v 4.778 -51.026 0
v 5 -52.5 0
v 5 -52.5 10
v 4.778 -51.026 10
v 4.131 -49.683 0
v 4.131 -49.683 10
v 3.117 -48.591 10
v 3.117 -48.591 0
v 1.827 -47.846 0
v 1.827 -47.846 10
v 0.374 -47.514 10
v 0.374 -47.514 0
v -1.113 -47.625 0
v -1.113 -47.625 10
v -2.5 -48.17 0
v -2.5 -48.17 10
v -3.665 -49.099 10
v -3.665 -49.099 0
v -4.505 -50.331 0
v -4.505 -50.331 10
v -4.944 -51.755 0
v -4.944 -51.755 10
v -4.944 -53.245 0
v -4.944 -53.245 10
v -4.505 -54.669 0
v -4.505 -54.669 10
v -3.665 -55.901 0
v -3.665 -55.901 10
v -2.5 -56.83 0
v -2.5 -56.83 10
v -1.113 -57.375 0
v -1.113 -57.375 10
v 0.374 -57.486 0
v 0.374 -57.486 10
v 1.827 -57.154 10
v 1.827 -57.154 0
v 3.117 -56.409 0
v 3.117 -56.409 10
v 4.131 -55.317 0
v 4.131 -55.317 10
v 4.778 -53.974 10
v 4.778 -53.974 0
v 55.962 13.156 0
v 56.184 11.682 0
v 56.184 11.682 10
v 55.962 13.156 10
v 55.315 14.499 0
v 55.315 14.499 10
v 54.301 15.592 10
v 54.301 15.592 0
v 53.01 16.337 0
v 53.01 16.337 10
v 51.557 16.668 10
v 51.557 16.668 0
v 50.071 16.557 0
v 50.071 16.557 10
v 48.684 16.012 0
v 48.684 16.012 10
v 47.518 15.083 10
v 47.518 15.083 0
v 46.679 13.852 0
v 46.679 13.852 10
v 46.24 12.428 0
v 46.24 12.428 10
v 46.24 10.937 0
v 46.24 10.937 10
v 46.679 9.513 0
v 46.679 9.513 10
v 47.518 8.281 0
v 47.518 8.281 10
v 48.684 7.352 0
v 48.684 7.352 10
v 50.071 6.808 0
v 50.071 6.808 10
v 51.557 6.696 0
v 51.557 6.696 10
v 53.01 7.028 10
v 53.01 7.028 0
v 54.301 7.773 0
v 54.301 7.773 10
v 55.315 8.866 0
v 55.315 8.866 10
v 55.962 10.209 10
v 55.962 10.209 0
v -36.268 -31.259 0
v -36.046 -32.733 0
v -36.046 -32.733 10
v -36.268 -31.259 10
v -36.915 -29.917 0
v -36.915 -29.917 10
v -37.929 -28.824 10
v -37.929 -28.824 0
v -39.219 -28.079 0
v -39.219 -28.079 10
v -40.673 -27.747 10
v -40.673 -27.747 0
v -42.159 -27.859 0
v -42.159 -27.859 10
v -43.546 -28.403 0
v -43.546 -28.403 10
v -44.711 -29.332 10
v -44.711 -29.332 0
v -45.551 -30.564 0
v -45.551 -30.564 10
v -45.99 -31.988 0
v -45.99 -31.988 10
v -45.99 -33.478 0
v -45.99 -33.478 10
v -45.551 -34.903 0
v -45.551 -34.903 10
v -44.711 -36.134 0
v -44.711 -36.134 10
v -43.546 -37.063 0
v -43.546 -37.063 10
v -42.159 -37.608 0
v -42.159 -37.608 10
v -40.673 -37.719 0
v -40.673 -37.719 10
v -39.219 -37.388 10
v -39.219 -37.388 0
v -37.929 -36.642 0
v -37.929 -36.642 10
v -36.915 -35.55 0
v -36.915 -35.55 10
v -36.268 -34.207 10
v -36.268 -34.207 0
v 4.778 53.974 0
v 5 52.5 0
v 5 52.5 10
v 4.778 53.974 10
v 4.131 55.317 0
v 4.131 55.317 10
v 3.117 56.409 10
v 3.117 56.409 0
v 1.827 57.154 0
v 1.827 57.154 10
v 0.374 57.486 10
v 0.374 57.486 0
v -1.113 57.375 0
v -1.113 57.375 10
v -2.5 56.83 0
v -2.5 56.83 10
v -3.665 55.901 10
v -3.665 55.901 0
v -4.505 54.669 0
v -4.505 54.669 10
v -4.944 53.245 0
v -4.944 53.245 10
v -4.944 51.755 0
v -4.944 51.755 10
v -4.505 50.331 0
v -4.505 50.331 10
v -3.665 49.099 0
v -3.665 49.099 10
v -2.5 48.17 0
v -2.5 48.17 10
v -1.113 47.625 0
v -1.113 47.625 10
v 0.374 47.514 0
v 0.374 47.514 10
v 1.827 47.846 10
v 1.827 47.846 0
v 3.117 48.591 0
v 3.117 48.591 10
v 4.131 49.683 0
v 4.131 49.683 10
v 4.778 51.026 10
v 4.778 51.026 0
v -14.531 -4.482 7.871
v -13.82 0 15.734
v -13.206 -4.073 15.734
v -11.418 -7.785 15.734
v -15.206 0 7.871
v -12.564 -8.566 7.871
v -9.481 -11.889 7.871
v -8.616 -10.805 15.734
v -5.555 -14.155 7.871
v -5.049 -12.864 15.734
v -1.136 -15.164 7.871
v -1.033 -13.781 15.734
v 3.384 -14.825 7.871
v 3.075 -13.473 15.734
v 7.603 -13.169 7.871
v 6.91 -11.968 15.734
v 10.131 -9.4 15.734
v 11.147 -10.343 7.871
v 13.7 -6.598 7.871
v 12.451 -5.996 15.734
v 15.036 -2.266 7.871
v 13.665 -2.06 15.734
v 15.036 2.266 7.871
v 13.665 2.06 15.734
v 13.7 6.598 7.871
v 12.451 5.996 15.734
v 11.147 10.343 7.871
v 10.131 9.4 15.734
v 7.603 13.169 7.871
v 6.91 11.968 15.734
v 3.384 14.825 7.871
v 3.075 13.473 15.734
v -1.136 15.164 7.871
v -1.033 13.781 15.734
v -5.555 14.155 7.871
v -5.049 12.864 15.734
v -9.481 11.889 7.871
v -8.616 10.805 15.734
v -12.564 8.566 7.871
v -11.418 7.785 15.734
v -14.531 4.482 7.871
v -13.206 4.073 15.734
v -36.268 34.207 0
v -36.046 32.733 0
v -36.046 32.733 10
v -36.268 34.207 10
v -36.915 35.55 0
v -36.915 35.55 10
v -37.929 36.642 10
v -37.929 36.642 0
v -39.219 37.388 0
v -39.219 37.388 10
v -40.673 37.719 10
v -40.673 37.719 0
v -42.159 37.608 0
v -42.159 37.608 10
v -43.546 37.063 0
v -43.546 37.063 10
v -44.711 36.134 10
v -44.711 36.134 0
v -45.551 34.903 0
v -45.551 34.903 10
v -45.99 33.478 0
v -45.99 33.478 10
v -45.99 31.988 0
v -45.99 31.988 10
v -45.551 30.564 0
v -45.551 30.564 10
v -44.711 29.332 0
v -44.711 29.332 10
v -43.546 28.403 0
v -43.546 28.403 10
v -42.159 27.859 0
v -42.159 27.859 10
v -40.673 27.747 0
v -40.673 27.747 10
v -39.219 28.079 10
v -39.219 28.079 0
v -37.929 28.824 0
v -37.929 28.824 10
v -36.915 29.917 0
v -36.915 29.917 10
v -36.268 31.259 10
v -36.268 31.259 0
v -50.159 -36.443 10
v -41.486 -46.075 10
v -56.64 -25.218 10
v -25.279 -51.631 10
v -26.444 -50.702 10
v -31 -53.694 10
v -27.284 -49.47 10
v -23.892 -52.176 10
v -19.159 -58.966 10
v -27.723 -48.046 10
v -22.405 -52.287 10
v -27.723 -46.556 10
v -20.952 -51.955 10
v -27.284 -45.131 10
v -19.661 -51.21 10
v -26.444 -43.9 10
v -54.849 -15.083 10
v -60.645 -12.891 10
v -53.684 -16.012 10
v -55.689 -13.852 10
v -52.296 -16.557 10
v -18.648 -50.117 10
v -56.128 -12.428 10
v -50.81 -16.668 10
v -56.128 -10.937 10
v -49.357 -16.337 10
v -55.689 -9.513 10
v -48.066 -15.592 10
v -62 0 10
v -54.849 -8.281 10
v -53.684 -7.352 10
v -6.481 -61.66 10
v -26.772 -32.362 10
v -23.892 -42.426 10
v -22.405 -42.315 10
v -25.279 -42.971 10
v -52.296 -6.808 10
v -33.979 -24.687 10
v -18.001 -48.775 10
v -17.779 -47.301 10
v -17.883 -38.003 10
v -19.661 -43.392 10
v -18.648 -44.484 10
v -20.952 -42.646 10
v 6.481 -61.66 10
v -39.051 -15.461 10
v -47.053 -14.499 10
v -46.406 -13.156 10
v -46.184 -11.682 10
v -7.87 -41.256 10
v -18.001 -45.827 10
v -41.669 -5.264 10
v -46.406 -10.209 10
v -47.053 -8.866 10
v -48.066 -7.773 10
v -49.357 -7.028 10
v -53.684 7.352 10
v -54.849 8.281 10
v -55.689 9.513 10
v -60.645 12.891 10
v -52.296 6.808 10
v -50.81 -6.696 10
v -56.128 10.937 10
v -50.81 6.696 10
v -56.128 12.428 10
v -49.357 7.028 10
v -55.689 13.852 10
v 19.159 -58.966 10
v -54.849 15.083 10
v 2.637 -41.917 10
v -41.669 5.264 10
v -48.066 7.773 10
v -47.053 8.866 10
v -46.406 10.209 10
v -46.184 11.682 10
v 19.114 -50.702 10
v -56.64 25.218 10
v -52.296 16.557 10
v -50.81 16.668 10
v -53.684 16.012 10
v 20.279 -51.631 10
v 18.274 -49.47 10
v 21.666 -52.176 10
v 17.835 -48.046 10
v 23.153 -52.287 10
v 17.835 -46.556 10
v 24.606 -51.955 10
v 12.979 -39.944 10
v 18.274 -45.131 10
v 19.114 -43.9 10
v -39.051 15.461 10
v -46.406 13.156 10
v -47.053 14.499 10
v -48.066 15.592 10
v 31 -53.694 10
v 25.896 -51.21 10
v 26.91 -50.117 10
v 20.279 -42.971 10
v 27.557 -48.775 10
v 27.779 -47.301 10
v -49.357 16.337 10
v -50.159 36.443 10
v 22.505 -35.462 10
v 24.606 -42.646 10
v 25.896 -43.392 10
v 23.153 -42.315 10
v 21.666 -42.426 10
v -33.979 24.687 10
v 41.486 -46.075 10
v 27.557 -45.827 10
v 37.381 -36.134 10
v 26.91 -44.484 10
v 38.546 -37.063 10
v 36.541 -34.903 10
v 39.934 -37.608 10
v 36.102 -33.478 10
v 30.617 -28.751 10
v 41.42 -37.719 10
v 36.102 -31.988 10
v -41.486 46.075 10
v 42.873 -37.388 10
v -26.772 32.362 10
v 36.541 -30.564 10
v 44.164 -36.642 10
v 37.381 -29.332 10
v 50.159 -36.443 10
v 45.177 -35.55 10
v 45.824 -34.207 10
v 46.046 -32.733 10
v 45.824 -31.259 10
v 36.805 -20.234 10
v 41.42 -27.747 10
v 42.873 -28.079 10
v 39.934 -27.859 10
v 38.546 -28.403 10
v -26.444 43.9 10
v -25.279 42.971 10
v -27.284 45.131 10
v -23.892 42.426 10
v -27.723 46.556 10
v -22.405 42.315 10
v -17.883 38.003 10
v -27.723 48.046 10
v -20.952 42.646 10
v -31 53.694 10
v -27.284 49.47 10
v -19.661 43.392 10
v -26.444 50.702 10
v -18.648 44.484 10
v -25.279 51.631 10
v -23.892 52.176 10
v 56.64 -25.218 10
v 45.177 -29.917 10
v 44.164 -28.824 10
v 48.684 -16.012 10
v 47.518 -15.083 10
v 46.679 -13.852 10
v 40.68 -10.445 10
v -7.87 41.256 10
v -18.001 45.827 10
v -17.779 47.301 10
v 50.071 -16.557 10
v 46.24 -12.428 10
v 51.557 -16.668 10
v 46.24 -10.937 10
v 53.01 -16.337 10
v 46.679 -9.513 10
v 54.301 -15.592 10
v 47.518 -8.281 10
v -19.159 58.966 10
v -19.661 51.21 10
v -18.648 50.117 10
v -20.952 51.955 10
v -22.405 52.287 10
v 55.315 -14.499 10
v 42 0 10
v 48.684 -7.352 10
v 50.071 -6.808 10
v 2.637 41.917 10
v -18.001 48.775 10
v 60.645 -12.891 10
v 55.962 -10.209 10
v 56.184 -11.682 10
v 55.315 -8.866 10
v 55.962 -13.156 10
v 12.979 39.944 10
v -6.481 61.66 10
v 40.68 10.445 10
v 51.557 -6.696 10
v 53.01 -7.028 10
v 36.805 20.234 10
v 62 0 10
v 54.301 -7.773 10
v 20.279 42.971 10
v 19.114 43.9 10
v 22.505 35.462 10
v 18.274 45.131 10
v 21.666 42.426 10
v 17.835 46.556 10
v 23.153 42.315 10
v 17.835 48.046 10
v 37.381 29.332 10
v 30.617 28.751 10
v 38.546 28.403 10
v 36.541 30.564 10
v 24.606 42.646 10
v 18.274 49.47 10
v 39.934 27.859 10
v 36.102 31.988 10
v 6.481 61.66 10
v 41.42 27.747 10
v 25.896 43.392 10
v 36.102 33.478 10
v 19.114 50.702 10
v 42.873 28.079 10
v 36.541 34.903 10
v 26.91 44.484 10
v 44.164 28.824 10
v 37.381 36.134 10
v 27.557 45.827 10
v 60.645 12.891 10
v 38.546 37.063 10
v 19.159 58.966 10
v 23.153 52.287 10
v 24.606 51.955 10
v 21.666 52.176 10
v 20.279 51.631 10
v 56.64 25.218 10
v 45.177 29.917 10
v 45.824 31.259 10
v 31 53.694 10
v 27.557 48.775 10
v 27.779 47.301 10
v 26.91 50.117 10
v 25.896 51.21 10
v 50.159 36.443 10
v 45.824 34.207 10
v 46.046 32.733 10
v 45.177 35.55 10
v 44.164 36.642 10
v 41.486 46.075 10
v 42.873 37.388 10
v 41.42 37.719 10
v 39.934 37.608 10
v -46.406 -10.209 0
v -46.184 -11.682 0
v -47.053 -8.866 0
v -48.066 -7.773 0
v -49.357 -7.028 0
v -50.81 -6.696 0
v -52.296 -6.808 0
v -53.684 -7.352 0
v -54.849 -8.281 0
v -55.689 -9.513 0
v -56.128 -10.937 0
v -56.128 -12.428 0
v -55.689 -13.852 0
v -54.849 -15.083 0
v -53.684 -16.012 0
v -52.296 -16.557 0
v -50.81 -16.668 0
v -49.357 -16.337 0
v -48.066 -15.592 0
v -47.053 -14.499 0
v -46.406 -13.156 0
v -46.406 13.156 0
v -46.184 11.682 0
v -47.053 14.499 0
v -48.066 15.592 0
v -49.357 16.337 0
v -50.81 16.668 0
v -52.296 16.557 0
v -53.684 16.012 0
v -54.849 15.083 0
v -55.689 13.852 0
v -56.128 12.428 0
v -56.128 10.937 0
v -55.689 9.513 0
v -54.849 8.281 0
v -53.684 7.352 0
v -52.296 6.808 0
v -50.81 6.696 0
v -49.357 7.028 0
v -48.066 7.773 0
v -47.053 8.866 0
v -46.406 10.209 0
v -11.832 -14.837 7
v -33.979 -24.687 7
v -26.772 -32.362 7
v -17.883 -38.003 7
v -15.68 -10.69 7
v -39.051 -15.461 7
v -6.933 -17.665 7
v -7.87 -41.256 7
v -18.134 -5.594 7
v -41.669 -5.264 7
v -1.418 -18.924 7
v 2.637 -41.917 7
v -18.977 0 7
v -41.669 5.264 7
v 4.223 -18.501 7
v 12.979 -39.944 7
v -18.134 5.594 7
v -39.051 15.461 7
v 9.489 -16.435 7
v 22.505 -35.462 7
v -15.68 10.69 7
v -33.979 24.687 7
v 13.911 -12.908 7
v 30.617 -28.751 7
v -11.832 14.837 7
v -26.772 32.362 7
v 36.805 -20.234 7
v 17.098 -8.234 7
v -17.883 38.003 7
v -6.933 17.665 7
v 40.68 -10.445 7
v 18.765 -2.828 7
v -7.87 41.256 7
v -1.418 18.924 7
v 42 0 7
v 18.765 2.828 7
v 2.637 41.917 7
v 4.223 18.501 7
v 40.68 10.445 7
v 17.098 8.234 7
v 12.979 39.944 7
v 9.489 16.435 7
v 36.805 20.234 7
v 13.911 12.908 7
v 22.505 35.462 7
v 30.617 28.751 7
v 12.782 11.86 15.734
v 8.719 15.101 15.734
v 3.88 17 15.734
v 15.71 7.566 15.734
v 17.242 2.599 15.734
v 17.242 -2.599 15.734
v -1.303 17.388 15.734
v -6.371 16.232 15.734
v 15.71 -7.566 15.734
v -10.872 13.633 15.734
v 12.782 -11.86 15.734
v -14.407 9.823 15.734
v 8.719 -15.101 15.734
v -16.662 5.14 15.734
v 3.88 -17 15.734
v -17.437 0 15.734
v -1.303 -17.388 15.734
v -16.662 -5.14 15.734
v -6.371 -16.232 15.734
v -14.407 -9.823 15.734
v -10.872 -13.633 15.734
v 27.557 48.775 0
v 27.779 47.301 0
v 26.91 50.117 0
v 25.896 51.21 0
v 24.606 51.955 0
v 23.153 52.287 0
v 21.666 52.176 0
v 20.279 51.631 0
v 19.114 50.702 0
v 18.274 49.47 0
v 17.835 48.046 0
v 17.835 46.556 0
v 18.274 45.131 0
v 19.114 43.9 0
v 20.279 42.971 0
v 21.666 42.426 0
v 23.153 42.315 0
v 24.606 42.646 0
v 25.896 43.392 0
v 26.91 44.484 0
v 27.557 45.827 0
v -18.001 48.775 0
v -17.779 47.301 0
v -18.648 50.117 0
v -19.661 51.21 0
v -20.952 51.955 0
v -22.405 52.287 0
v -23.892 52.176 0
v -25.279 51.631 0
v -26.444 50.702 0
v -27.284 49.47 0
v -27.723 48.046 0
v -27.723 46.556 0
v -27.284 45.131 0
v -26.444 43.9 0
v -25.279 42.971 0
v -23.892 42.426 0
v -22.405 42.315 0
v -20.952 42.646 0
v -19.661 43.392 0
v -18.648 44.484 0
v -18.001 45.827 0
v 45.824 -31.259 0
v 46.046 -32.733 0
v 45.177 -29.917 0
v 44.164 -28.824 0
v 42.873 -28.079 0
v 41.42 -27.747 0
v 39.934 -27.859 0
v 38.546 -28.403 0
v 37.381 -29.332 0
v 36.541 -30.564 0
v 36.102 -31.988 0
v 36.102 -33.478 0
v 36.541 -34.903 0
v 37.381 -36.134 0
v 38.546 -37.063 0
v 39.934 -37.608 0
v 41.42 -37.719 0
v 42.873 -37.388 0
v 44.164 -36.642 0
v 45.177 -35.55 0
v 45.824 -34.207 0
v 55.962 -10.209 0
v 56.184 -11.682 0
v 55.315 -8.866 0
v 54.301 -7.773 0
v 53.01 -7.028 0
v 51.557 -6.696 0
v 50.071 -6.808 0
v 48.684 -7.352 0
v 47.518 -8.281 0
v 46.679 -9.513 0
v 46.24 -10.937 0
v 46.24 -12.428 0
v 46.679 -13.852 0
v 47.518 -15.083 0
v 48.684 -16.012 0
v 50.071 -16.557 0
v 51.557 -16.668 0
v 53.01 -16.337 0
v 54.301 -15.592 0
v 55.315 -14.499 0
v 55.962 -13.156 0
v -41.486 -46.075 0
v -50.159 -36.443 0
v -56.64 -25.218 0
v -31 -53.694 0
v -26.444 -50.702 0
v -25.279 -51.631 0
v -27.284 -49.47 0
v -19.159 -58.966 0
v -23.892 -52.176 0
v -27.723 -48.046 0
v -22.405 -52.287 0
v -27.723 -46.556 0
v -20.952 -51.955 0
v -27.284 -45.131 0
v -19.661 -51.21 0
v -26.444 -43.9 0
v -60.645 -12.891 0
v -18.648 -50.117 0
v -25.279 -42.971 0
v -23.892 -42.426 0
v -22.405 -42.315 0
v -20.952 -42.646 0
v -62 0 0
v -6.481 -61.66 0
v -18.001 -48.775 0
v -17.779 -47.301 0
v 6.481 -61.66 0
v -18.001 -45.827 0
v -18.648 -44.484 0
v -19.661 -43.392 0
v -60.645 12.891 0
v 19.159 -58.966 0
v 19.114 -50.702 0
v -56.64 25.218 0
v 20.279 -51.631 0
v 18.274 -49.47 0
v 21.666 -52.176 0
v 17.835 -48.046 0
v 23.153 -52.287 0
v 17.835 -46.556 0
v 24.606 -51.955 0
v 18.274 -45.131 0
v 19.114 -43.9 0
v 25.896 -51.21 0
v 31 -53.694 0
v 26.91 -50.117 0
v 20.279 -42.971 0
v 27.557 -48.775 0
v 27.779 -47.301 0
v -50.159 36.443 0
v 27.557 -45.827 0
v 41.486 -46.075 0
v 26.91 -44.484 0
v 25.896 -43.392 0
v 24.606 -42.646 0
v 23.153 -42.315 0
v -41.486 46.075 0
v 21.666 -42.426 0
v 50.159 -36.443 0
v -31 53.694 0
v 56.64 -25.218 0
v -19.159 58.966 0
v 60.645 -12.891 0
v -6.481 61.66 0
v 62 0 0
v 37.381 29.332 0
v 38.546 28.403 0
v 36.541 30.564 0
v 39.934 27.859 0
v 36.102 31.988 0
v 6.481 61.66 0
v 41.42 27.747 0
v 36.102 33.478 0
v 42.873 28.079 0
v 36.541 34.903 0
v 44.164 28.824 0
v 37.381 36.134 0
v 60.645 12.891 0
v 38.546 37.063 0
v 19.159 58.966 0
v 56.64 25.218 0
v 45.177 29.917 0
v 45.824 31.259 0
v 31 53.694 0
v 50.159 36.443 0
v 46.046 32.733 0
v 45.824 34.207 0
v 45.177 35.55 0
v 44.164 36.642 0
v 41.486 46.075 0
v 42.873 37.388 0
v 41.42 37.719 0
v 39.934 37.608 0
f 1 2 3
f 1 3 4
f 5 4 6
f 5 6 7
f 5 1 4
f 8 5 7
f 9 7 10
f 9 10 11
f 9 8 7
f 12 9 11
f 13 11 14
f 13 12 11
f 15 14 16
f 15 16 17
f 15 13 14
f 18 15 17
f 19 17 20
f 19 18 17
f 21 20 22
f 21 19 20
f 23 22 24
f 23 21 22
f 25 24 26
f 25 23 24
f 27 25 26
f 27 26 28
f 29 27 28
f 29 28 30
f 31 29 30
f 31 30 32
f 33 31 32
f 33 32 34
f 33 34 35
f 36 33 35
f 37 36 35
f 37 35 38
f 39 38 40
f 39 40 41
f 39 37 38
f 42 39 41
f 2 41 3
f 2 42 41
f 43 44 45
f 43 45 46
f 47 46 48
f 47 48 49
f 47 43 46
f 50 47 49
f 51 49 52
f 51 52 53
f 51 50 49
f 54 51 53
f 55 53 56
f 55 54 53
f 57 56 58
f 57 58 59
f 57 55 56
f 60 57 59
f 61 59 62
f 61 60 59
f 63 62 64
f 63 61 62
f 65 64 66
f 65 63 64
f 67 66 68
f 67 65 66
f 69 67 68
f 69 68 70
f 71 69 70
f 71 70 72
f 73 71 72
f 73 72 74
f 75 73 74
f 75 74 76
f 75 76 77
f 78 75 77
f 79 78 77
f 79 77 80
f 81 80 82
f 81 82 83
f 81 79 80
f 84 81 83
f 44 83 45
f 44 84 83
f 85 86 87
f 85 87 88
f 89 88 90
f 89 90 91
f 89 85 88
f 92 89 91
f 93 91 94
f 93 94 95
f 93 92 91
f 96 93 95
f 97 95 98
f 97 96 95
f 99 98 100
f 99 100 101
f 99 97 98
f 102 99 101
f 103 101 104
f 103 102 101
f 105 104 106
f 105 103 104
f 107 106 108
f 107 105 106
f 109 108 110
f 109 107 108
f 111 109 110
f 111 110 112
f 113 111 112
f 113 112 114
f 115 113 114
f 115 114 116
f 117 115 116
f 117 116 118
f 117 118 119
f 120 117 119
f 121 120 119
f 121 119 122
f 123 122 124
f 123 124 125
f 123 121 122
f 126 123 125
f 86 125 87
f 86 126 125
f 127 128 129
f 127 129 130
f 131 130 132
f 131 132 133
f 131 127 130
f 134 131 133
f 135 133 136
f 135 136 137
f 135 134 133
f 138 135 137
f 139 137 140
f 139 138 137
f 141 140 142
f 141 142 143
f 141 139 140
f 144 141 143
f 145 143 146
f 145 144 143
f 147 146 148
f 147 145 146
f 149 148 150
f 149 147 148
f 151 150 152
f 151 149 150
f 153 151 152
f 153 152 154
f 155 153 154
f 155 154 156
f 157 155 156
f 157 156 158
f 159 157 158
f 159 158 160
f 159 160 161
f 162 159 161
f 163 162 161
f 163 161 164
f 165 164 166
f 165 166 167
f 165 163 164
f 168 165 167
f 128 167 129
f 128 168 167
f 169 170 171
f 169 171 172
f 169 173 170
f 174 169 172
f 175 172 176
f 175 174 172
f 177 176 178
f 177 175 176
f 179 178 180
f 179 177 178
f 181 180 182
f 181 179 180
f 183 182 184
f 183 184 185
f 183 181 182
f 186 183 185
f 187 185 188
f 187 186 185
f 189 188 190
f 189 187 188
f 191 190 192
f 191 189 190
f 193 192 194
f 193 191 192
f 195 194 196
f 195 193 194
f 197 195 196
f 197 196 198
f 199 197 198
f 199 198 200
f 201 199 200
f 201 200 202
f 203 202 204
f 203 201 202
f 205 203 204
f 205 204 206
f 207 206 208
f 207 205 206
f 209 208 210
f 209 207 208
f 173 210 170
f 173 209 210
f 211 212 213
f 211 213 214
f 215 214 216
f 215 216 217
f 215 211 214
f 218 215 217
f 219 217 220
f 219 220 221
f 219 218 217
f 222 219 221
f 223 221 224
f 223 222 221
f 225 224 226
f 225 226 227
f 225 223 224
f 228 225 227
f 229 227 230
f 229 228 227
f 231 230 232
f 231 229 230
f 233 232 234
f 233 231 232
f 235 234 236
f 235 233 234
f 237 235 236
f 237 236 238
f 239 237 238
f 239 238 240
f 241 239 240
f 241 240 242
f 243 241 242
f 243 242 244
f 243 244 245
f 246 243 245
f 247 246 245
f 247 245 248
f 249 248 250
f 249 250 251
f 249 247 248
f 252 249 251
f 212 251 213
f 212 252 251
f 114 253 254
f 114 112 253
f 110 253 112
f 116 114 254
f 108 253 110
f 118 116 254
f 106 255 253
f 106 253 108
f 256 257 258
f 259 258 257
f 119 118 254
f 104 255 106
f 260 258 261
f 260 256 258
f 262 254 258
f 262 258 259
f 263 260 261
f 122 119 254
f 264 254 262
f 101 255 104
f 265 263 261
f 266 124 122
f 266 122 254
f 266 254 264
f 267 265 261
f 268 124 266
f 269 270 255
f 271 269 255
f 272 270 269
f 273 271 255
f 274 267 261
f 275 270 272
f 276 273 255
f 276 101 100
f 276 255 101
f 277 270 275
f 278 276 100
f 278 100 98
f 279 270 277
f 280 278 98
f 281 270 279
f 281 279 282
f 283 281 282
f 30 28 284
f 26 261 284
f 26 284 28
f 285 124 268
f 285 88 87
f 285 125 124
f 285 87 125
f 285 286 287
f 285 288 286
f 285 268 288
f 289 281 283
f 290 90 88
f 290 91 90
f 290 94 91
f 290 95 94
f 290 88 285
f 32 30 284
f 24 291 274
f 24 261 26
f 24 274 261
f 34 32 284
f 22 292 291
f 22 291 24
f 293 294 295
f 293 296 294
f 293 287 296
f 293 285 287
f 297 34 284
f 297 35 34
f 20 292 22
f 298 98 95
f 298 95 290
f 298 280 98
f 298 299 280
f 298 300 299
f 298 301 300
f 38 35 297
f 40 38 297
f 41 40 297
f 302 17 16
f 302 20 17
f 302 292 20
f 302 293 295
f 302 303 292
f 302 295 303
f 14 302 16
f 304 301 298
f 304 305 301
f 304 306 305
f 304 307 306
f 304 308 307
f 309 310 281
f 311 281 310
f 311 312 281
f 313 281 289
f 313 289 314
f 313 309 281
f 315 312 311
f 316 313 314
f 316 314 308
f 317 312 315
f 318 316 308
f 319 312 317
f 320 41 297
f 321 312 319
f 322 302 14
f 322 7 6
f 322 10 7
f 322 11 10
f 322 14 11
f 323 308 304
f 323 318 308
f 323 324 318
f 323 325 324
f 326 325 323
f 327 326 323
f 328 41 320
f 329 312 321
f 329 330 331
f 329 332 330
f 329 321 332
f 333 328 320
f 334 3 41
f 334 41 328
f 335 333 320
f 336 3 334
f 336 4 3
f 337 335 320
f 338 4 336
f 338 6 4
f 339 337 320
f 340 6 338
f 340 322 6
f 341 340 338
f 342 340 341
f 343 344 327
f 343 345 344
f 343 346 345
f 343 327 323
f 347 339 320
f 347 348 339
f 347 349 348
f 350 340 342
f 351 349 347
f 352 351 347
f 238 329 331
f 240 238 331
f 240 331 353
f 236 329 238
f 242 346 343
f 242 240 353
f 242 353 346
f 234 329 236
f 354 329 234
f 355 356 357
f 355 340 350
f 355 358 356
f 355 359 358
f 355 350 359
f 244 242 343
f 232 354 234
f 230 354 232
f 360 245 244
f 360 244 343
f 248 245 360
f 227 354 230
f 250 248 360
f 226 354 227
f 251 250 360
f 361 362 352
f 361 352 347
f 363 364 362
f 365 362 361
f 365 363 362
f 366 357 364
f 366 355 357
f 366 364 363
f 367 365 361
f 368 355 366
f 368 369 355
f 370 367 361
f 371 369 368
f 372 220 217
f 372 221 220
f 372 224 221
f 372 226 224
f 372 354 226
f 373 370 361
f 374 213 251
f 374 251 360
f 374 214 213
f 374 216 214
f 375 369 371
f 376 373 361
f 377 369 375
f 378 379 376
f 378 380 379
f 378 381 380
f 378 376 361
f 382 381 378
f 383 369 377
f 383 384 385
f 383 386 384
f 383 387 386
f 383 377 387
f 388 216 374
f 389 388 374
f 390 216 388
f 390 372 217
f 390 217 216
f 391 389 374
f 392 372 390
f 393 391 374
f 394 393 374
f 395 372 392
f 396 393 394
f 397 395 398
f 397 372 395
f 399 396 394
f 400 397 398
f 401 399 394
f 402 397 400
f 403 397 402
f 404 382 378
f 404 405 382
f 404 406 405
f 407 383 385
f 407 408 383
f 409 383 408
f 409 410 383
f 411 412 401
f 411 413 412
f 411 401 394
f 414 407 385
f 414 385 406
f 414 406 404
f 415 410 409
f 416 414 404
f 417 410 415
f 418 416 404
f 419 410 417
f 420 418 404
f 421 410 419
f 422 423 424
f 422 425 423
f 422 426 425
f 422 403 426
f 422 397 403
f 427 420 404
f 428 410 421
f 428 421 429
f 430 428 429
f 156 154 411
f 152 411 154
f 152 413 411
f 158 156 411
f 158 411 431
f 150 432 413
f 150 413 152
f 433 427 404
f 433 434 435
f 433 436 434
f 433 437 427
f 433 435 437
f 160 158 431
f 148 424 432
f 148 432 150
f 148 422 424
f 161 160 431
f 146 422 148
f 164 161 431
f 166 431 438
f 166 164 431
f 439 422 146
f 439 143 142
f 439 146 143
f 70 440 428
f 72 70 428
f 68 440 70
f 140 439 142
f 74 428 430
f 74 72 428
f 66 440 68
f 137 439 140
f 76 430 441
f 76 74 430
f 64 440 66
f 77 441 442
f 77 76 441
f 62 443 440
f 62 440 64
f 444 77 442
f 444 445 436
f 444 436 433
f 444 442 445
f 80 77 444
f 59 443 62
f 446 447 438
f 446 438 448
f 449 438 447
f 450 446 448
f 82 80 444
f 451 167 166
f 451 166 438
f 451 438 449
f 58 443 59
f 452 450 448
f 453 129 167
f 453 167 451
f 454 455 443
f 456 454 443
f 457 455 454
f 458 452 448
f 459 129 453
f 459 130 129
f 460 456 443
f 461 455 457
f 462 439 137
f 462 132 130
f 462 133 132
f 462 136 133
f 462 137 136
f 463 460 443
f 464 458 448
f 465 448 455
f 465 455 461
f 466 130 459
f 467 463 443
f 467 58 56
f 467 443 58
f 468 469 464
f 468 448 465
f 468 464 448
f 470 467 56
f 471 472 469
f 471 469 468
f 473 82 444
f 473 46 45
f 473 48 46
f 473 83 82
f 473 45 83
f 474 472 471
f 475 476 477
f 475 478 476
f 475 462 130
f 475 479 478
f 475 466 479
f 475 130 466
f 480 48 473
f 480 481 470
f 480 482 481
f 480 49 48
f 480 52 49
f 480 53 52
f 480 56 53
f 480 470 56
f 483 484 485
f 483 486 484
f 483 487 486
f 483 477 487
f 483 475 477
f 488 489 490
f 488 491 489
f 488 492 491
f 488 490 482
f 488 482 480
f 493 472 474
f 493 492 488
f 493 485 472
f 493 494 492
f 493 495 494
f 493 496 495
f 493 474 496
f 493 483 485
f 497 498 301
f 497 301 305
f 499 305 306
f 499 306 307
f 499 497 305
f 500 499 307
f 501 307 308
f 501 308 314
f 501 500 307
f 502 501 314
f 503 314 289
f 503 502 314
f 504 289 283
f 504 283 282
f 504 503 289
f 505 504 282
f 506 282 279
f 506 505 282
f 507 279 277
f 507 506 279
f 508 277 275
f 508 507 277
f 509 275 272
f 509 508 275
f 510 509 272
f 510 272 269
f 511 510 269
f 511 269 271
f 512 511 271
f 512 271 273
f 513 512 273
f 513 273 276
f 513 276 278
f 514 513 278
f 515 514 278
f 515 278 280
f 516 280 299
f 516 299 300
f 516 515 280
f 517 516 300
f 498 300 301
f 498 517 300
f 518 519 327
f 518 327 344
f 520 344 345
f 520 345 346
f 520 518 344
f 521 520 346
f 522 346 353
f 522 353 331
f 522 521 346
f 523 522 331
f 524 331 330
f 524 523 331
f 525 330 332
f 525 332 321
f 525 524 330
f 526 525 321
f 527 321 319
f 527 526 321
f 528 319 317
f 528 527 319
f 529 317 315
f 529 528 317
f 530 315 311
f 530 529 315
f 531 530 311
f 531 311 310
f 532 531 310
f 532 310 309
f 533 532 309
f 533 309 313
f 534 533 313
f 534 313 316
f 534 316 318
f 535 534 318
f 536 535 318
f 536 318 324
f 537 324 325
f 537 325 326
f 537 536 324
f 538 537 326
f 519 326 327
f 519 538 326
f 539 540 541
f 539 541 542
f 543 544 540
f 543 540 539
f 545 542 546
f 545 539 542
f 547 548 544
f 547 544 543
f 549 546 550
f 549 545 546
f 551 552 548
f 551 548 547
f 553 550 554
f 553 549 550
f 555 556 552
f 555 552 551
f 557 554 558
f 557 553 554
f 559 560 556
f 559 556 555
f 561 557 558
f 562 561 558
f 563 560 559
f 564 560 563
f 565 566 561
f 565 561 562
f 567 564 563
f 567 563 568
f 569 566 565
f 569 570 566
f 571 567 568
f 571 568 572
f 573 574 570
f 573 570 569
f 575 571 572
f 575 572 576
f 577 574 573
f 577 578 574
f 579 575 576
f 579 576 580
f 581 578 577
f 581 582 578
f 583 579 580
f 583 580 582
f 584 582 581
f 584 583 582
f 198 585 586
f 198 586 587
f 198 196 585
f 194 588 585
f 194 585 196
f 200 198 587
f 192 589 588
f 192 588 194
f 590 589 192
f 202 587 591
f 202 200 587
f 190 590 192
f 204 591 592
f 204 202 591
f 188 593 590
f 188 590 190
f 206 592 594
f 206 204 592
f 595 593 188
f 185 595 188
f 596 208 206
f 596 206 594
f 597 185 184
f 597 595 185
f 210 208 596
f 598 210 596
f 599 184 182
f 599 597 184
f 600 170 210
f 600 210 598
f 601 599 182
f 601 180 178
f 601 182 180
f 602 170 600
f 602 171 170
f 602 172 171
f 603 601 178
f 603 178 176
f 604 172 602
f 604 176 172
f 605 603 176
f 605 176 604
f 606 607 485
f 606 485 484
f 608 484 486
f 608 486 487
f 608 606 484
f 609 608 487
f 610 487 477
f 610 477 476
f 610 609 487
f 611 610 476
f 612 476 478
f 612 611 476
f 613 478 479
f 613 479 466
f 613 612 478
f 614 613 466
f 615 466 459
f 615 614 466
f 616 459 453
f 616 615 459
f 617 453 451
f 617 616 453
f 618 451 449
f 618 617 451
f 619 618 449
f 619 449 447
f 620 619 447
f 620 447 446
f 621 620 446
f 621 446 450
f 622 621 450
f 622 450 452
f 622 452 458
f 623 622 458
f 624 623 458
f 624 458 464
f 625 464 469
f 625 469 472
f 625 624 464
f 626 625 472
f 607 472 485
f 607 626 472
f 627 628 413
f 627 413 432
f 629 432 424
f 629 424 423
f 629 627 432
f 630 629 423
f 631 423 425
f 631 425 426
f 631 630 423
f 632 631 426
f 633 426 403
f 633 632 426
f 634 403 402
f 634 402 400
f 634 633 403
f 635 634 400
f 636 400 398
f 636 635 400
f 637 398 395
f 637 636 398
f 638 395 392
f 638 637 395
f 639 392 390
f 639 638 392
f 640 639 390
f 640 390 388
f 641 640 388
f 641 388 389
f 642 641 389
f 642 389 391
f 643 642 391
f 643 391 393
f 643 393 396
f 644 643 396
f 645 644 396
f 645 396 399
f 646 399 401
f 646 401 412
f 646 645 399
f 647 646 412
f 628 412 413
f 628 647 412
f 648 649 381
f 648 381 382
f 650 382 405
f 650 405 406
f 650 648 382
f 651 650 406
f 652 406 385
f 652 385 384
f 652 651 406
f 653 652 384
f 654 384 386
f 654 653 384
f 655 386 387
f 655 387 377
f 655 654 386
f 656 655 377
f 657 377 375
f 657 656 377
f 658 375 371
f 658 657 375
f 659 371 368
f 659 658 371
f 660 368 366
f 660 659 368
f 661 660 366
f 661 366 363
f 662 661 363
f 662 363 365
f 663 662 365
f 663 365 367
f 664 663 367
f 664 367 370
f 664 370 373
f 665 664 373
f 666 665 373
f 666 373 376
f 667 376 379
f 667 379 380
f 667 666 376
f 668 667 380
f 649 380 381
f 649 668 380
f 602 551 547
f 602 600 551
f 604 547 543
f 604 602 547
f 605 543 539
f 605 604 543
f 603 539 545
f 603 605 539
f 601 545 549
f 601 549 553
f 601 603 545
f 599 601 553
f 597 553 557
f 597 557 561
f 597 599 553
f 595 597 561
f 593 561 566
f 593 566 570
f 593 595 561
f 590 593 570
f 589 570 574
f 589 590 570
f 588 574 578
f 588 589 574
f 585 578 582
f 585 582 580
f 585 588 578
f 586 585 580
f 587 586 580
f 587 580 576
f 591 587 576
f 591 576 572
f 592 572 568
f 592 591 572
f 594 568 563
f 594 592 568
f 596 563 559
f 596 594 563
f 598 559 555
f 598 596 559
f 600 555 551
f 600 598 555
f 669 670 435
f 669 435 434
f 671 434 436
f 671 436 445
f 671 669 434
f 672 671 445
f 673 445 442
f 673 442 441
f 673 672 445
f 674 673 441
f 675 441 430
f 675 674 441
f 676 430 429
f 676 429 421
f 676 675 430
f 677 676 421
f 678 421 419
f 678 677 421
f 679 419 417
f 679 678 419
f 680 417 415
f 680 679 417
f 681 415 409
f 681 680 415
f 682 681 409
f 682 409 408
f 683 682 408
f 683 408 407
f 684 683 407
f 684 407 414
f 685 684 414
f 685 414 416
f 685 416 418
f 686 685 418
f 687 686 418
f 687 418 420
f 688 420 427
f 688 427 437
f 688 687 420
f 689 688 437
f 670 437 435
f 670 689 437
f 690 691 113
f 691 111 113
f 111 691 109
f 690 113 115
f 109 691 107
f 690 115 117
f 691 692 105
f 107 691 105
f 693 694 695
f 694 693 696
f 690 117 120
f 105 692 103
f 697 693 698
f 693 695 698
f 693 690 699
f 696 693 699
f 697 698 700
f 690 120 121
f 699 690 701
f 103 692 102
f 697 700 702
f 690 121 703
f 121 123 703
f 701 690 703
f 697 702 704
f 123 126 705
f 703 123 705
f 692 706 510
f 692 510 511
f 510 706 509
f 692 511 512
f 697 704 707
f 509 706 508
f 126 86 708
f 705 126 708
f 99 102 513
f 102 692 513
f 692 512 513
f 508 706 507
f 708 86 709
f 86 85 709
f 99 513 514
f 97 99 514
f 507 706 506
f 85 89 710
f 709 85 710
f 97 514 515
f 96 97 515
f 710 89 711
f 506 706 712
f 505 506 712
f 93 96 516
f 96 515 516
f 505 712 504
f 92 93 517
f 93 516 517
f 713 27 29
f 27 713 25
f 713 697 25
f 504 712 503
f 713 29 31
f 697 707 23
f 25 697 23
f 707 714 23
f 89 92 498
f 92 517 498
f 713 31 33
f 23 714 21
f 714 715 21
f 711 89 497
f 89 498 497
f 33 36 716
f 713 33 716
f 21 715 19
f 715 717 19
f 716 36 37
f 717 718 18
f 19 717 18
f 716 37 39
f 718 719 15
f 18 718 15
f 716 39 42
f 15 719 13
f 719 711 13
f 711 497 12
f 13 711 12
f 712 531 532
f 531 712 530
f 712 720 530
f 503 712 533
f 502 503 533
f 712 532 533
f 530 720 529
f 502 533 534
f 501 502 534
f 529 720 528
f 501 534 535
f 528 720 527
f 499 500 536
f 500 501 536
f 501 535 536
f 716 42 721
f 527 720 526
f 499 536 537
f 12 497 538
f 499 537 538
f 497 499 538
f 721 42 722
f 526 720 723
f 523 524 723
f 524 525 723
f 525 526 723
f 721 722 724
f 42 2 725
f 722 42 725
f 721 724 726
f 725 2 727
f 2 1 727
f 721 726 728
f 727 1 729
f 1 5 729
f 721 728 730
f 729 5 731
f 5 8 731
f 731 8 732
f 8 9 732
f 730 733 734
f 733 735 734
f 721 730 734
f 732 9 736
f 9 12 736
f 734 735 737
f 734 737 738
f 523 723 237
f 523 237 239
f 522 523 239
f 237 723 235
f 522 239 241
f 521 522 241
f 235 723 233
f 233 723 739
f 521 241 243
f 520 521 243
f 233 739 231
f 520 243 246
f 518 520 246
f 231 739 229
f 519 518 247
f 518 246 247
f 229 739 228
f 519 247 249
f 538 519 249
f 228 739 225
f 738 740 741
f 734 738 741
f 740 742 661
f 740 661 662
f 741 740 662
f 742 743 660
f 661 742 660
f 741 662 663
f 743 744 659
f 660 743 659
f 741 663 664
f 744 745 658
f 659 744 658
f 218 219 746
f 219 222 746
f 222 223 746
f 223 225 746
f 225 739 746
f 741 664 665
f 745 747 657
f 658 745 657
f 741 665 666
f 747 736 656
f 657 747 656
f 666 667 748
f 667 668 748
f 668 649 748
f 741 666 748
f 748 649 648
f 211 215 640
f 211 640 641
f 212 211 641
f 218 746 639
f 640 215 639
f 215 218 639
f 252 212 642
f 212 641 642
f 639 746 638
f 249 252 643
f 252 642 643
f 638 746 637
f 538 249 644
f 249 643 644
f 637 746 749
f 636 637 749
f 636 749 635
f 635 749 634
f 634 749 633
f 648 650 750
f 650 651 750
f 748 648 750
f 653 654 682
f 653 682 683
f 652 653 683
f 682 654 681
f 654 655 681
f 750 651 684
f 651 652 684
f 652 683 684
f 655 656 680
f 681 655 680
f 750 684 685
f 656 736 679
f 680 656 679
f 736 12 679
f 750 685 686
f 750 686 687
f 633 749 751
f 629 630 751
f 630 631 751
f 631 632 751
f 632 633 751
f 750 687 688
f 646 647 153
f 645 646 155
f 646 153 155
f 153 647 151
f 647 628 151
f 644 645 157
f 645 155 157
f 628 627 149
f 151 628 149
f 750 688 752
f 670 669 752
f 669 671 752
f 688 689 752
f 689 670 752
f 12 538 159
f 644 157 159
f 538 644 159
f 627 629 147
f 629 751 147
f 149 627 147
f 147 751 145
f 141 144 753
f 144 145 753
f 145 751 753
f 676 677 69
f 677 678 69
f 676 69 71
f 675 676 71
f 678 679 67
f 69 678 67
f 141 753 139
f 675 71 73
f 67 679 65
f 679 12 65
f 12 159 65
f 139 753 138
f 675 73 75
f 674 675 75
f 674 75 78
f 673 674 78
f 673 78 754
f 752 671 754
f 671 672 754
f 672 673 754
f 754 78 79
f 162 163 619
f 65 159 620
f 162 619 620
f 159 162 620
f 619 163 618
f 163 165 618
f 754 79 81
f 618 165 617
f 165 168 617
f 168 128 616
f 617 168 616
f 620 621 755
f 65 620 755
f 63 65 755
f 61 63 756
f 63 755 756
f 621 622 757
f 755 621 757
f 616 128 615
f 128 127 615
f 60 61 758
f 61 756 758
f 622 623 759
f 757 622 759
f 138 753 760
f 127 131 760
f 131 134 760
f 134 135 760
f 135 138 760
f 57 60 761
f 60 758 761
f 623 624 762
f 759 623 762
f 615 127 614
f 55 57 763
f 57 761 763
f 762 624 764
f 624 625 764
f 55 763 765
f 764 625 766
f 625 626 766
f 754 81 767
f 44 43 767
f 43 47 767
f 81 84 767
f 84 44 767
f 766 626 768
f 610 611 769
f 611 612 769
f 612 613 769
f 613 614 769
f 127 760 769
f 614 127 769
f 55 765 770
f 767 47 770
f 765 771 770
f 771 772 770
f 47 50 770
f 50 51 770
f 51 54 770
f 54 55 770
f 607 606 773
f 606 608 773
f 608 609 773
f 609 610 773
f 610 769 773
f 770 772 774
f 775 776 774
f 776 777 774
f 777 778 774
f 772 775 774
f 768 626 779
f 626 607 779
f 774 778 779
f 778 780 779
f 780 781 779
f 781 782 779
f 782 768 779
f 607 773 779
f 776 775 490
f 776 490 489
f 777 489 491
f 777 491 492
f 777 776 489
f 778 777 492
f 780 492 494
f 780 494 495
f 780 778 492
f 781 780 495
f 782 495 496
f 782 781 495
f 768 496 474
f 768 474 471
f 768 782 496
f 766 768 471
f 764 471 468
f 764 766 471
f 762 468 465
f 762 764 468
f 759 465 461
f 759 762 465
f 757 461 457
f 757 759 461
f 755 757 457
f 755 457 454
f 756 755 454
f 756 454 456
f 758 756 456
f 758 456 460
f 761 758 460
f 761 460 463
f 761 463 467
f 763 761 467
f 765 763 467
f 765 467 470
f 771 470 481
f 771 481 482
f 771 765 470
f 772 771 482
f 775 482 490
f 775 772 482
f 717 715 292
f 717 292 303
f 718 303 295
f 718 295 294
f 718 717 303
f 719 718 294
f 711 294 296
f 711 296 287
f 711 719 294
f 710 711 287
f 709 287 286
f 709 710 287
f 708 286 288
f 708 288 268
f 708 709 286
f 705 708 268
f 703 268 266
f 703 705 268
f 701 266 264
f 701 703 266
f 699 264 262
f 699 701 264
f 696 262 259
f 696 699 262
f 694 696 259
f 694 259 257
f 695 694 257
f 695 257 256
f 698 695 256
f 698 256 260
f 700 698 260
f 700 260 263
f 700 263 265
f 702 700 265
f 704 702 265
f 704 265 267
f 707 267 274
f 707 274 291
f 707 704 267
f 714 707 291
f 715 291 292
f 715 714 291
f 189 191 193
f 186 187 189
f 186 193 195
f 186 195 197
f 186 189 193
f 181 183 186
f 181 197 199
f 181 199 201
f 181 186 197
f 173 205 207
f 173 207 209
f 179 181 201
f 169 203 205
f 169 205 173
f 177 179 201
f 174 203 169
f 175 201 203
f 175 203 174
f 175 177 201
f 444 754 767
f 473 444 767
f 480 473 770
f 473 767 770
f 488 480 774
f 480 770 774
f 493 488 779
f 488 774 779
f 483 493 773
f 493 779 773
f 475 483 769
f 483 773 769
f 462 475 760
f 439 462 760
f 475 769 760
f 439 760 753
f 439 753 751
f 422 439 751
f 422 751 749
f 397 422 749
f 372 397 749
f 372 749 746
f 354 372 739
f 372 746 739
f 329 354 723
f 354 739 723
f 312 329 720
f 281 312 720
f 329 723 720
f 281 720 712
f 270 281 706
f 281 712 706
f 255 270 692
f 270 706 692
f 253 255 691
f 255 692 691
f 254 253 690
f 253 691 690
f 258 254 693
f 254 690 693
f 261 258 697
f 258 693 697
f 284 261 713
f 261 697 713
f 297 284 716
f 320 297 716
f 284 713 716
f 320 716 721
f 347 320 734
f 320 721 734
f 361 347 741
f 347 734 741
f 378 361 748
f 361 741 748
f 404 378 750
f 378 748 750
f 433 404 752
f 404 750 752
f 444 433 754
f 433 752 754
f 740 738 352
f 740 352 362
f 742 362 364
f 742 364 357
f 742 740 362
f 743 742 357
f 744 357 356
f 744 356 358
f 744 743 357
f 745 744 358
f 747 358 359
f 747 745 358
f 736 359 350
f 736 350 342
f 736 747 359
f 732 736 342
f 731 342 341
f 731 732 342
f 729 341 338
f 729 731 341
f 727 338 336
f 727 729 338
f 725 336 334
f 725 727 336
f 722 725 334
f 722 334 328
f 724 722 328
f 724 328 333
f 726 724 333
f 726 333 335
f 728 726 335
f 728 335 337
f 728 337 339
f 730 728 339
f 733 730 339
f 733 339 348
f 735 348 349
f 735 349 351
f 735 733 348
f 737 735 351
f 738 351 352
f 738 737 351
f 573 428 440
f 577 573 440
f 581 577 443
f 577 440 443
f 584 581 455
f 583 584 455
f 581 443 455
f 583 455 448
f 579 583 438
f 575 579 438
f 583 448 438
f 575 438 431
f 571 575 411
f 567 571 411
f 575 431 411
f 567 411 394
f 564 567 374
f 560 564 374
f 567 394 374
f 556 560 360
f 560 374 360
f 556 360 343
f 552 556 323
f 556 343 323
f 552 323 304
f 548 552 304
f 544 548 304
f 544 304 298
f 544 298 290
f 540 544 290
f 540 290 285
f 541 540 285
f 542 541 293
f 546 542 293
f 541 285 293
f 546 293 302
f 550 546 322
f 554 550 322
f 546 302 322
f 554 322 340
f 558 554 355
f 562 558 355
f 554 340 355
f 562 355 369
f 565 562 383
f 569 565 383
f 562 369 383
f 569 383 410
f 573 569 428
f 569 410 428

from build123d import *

# Parameters (mm, degrees)
SKETCH1_R           = 62
SKETCH1_R_2         = 5
SKETCH1_R_3         = 43
BOSS_EXTRUDE2_DEPTH = 10
SKETCH2_R           = 42
CUT_EXTRUDE1_DEPTH  = 3


with BuildPart() as part:
    # Sketch1 → Boss-Extrude2 (new body)
    # profile 1 of 2: a face of its own
    with BuildSketch(Plane.XY):
        Circle(SKETCH1_R)
        with Locations((-22.778896304, 47.300865565)):
            Circle(SKETCH1_R_2, mode=Mode.SUBTRACT)
        with Locations((-41.04615283, 32.733214598)):
            Circle(SKETCH1_R_2, mode=Mode.SUBTRACT)
        with Locations((-51.18371539, 11.682349033)):
            Circle(SKETCH1_R_2, mode=Mode.SUBTRACT)
        with Locations((-51.18371539, -11.682349033)):
            Circle(SKETCH1_R_2, mode=Mode.SUBTRACT)
        with Locations((-41.04615283, -32.733214598)):
            Circle(SKETCH1_R_2, mode=Mode.SUBTRACT)
        with Locations((-22.778896304, -47.300865565)):
            Circle(SKETCH1_R_2, mode=Mode.SUBTRACT)
        with Locations((0, -52.5)):
            Circle(SKETCH1_R_2, mode=Mode.SUBTRACT)
        with Locations((22.778896304, -47.300865565)):
            Circle(SKETCH1_R_2, mode=Mode.SUBTRACT)
        with Locations((41.04615283, -32.733214598)):
            Circle(SKETCH1_R_2, mode=Mode.SUBTRACT)
        with Locations((51.18371539, -11.682349033)):
            Circle(SKETCH1_R_2, mode=Mode.SUBTRACT)
        with Locations((51.18371539, 11.682349033)):
            Circle(SKETCH1_R_2, mode=Mode.SUBTRACT)
        with Locations((41.04615283, 32.733214598)):
            Circle(SKETCH1_R_2, mode=Mode.SUBTRACT)
        with Locations((22.778896304, 47.300865565)):
            Circle(SKETCH1_R_2, mode=Mode.SUBTRACT)
        with Locations((0, 52.5)):
            Circle(SKETCH1_R_2, mode=Mode.SUBTRACT)
        Circle(SKETCH1_R_3, mode=Mode.SUBTRACT)
    # profile 2 of 2: a face of its own
    with BuildSketch(Plane.XY):
        Circle(SKETCH1_R_3)
    extrude(amount=BOSS_EXTRUDE2_DEPTH)

    # Sketch2 → Cut-Extrude1 (cut)
    with BuildSketch(Plane.XY.offset(10)):
        Circle(SKETCH2_R)
    extrude(amount=-CUT_EXTRUDE1_DEPTH, mode=Mode.SUBTRACT)

    # Sketch5 → Revolve1 (revolve)
    with BuildSketch(Plane(origin=(0, 0, 0), x_dir=(1, 0, 0), z_dir=(0, 1, 0))):
        Polygon((0, -6.870835564), (-19, -6.870835564), (-17.437166401, -15.734105341), (-13.81978154, -15.734105341), (-15.206288158, -7.870835564), (0, -7.870835564), align=None)
    revolve(axis=Axis((0, 0, 0), (0, 0, 1)))


solid = part.part
